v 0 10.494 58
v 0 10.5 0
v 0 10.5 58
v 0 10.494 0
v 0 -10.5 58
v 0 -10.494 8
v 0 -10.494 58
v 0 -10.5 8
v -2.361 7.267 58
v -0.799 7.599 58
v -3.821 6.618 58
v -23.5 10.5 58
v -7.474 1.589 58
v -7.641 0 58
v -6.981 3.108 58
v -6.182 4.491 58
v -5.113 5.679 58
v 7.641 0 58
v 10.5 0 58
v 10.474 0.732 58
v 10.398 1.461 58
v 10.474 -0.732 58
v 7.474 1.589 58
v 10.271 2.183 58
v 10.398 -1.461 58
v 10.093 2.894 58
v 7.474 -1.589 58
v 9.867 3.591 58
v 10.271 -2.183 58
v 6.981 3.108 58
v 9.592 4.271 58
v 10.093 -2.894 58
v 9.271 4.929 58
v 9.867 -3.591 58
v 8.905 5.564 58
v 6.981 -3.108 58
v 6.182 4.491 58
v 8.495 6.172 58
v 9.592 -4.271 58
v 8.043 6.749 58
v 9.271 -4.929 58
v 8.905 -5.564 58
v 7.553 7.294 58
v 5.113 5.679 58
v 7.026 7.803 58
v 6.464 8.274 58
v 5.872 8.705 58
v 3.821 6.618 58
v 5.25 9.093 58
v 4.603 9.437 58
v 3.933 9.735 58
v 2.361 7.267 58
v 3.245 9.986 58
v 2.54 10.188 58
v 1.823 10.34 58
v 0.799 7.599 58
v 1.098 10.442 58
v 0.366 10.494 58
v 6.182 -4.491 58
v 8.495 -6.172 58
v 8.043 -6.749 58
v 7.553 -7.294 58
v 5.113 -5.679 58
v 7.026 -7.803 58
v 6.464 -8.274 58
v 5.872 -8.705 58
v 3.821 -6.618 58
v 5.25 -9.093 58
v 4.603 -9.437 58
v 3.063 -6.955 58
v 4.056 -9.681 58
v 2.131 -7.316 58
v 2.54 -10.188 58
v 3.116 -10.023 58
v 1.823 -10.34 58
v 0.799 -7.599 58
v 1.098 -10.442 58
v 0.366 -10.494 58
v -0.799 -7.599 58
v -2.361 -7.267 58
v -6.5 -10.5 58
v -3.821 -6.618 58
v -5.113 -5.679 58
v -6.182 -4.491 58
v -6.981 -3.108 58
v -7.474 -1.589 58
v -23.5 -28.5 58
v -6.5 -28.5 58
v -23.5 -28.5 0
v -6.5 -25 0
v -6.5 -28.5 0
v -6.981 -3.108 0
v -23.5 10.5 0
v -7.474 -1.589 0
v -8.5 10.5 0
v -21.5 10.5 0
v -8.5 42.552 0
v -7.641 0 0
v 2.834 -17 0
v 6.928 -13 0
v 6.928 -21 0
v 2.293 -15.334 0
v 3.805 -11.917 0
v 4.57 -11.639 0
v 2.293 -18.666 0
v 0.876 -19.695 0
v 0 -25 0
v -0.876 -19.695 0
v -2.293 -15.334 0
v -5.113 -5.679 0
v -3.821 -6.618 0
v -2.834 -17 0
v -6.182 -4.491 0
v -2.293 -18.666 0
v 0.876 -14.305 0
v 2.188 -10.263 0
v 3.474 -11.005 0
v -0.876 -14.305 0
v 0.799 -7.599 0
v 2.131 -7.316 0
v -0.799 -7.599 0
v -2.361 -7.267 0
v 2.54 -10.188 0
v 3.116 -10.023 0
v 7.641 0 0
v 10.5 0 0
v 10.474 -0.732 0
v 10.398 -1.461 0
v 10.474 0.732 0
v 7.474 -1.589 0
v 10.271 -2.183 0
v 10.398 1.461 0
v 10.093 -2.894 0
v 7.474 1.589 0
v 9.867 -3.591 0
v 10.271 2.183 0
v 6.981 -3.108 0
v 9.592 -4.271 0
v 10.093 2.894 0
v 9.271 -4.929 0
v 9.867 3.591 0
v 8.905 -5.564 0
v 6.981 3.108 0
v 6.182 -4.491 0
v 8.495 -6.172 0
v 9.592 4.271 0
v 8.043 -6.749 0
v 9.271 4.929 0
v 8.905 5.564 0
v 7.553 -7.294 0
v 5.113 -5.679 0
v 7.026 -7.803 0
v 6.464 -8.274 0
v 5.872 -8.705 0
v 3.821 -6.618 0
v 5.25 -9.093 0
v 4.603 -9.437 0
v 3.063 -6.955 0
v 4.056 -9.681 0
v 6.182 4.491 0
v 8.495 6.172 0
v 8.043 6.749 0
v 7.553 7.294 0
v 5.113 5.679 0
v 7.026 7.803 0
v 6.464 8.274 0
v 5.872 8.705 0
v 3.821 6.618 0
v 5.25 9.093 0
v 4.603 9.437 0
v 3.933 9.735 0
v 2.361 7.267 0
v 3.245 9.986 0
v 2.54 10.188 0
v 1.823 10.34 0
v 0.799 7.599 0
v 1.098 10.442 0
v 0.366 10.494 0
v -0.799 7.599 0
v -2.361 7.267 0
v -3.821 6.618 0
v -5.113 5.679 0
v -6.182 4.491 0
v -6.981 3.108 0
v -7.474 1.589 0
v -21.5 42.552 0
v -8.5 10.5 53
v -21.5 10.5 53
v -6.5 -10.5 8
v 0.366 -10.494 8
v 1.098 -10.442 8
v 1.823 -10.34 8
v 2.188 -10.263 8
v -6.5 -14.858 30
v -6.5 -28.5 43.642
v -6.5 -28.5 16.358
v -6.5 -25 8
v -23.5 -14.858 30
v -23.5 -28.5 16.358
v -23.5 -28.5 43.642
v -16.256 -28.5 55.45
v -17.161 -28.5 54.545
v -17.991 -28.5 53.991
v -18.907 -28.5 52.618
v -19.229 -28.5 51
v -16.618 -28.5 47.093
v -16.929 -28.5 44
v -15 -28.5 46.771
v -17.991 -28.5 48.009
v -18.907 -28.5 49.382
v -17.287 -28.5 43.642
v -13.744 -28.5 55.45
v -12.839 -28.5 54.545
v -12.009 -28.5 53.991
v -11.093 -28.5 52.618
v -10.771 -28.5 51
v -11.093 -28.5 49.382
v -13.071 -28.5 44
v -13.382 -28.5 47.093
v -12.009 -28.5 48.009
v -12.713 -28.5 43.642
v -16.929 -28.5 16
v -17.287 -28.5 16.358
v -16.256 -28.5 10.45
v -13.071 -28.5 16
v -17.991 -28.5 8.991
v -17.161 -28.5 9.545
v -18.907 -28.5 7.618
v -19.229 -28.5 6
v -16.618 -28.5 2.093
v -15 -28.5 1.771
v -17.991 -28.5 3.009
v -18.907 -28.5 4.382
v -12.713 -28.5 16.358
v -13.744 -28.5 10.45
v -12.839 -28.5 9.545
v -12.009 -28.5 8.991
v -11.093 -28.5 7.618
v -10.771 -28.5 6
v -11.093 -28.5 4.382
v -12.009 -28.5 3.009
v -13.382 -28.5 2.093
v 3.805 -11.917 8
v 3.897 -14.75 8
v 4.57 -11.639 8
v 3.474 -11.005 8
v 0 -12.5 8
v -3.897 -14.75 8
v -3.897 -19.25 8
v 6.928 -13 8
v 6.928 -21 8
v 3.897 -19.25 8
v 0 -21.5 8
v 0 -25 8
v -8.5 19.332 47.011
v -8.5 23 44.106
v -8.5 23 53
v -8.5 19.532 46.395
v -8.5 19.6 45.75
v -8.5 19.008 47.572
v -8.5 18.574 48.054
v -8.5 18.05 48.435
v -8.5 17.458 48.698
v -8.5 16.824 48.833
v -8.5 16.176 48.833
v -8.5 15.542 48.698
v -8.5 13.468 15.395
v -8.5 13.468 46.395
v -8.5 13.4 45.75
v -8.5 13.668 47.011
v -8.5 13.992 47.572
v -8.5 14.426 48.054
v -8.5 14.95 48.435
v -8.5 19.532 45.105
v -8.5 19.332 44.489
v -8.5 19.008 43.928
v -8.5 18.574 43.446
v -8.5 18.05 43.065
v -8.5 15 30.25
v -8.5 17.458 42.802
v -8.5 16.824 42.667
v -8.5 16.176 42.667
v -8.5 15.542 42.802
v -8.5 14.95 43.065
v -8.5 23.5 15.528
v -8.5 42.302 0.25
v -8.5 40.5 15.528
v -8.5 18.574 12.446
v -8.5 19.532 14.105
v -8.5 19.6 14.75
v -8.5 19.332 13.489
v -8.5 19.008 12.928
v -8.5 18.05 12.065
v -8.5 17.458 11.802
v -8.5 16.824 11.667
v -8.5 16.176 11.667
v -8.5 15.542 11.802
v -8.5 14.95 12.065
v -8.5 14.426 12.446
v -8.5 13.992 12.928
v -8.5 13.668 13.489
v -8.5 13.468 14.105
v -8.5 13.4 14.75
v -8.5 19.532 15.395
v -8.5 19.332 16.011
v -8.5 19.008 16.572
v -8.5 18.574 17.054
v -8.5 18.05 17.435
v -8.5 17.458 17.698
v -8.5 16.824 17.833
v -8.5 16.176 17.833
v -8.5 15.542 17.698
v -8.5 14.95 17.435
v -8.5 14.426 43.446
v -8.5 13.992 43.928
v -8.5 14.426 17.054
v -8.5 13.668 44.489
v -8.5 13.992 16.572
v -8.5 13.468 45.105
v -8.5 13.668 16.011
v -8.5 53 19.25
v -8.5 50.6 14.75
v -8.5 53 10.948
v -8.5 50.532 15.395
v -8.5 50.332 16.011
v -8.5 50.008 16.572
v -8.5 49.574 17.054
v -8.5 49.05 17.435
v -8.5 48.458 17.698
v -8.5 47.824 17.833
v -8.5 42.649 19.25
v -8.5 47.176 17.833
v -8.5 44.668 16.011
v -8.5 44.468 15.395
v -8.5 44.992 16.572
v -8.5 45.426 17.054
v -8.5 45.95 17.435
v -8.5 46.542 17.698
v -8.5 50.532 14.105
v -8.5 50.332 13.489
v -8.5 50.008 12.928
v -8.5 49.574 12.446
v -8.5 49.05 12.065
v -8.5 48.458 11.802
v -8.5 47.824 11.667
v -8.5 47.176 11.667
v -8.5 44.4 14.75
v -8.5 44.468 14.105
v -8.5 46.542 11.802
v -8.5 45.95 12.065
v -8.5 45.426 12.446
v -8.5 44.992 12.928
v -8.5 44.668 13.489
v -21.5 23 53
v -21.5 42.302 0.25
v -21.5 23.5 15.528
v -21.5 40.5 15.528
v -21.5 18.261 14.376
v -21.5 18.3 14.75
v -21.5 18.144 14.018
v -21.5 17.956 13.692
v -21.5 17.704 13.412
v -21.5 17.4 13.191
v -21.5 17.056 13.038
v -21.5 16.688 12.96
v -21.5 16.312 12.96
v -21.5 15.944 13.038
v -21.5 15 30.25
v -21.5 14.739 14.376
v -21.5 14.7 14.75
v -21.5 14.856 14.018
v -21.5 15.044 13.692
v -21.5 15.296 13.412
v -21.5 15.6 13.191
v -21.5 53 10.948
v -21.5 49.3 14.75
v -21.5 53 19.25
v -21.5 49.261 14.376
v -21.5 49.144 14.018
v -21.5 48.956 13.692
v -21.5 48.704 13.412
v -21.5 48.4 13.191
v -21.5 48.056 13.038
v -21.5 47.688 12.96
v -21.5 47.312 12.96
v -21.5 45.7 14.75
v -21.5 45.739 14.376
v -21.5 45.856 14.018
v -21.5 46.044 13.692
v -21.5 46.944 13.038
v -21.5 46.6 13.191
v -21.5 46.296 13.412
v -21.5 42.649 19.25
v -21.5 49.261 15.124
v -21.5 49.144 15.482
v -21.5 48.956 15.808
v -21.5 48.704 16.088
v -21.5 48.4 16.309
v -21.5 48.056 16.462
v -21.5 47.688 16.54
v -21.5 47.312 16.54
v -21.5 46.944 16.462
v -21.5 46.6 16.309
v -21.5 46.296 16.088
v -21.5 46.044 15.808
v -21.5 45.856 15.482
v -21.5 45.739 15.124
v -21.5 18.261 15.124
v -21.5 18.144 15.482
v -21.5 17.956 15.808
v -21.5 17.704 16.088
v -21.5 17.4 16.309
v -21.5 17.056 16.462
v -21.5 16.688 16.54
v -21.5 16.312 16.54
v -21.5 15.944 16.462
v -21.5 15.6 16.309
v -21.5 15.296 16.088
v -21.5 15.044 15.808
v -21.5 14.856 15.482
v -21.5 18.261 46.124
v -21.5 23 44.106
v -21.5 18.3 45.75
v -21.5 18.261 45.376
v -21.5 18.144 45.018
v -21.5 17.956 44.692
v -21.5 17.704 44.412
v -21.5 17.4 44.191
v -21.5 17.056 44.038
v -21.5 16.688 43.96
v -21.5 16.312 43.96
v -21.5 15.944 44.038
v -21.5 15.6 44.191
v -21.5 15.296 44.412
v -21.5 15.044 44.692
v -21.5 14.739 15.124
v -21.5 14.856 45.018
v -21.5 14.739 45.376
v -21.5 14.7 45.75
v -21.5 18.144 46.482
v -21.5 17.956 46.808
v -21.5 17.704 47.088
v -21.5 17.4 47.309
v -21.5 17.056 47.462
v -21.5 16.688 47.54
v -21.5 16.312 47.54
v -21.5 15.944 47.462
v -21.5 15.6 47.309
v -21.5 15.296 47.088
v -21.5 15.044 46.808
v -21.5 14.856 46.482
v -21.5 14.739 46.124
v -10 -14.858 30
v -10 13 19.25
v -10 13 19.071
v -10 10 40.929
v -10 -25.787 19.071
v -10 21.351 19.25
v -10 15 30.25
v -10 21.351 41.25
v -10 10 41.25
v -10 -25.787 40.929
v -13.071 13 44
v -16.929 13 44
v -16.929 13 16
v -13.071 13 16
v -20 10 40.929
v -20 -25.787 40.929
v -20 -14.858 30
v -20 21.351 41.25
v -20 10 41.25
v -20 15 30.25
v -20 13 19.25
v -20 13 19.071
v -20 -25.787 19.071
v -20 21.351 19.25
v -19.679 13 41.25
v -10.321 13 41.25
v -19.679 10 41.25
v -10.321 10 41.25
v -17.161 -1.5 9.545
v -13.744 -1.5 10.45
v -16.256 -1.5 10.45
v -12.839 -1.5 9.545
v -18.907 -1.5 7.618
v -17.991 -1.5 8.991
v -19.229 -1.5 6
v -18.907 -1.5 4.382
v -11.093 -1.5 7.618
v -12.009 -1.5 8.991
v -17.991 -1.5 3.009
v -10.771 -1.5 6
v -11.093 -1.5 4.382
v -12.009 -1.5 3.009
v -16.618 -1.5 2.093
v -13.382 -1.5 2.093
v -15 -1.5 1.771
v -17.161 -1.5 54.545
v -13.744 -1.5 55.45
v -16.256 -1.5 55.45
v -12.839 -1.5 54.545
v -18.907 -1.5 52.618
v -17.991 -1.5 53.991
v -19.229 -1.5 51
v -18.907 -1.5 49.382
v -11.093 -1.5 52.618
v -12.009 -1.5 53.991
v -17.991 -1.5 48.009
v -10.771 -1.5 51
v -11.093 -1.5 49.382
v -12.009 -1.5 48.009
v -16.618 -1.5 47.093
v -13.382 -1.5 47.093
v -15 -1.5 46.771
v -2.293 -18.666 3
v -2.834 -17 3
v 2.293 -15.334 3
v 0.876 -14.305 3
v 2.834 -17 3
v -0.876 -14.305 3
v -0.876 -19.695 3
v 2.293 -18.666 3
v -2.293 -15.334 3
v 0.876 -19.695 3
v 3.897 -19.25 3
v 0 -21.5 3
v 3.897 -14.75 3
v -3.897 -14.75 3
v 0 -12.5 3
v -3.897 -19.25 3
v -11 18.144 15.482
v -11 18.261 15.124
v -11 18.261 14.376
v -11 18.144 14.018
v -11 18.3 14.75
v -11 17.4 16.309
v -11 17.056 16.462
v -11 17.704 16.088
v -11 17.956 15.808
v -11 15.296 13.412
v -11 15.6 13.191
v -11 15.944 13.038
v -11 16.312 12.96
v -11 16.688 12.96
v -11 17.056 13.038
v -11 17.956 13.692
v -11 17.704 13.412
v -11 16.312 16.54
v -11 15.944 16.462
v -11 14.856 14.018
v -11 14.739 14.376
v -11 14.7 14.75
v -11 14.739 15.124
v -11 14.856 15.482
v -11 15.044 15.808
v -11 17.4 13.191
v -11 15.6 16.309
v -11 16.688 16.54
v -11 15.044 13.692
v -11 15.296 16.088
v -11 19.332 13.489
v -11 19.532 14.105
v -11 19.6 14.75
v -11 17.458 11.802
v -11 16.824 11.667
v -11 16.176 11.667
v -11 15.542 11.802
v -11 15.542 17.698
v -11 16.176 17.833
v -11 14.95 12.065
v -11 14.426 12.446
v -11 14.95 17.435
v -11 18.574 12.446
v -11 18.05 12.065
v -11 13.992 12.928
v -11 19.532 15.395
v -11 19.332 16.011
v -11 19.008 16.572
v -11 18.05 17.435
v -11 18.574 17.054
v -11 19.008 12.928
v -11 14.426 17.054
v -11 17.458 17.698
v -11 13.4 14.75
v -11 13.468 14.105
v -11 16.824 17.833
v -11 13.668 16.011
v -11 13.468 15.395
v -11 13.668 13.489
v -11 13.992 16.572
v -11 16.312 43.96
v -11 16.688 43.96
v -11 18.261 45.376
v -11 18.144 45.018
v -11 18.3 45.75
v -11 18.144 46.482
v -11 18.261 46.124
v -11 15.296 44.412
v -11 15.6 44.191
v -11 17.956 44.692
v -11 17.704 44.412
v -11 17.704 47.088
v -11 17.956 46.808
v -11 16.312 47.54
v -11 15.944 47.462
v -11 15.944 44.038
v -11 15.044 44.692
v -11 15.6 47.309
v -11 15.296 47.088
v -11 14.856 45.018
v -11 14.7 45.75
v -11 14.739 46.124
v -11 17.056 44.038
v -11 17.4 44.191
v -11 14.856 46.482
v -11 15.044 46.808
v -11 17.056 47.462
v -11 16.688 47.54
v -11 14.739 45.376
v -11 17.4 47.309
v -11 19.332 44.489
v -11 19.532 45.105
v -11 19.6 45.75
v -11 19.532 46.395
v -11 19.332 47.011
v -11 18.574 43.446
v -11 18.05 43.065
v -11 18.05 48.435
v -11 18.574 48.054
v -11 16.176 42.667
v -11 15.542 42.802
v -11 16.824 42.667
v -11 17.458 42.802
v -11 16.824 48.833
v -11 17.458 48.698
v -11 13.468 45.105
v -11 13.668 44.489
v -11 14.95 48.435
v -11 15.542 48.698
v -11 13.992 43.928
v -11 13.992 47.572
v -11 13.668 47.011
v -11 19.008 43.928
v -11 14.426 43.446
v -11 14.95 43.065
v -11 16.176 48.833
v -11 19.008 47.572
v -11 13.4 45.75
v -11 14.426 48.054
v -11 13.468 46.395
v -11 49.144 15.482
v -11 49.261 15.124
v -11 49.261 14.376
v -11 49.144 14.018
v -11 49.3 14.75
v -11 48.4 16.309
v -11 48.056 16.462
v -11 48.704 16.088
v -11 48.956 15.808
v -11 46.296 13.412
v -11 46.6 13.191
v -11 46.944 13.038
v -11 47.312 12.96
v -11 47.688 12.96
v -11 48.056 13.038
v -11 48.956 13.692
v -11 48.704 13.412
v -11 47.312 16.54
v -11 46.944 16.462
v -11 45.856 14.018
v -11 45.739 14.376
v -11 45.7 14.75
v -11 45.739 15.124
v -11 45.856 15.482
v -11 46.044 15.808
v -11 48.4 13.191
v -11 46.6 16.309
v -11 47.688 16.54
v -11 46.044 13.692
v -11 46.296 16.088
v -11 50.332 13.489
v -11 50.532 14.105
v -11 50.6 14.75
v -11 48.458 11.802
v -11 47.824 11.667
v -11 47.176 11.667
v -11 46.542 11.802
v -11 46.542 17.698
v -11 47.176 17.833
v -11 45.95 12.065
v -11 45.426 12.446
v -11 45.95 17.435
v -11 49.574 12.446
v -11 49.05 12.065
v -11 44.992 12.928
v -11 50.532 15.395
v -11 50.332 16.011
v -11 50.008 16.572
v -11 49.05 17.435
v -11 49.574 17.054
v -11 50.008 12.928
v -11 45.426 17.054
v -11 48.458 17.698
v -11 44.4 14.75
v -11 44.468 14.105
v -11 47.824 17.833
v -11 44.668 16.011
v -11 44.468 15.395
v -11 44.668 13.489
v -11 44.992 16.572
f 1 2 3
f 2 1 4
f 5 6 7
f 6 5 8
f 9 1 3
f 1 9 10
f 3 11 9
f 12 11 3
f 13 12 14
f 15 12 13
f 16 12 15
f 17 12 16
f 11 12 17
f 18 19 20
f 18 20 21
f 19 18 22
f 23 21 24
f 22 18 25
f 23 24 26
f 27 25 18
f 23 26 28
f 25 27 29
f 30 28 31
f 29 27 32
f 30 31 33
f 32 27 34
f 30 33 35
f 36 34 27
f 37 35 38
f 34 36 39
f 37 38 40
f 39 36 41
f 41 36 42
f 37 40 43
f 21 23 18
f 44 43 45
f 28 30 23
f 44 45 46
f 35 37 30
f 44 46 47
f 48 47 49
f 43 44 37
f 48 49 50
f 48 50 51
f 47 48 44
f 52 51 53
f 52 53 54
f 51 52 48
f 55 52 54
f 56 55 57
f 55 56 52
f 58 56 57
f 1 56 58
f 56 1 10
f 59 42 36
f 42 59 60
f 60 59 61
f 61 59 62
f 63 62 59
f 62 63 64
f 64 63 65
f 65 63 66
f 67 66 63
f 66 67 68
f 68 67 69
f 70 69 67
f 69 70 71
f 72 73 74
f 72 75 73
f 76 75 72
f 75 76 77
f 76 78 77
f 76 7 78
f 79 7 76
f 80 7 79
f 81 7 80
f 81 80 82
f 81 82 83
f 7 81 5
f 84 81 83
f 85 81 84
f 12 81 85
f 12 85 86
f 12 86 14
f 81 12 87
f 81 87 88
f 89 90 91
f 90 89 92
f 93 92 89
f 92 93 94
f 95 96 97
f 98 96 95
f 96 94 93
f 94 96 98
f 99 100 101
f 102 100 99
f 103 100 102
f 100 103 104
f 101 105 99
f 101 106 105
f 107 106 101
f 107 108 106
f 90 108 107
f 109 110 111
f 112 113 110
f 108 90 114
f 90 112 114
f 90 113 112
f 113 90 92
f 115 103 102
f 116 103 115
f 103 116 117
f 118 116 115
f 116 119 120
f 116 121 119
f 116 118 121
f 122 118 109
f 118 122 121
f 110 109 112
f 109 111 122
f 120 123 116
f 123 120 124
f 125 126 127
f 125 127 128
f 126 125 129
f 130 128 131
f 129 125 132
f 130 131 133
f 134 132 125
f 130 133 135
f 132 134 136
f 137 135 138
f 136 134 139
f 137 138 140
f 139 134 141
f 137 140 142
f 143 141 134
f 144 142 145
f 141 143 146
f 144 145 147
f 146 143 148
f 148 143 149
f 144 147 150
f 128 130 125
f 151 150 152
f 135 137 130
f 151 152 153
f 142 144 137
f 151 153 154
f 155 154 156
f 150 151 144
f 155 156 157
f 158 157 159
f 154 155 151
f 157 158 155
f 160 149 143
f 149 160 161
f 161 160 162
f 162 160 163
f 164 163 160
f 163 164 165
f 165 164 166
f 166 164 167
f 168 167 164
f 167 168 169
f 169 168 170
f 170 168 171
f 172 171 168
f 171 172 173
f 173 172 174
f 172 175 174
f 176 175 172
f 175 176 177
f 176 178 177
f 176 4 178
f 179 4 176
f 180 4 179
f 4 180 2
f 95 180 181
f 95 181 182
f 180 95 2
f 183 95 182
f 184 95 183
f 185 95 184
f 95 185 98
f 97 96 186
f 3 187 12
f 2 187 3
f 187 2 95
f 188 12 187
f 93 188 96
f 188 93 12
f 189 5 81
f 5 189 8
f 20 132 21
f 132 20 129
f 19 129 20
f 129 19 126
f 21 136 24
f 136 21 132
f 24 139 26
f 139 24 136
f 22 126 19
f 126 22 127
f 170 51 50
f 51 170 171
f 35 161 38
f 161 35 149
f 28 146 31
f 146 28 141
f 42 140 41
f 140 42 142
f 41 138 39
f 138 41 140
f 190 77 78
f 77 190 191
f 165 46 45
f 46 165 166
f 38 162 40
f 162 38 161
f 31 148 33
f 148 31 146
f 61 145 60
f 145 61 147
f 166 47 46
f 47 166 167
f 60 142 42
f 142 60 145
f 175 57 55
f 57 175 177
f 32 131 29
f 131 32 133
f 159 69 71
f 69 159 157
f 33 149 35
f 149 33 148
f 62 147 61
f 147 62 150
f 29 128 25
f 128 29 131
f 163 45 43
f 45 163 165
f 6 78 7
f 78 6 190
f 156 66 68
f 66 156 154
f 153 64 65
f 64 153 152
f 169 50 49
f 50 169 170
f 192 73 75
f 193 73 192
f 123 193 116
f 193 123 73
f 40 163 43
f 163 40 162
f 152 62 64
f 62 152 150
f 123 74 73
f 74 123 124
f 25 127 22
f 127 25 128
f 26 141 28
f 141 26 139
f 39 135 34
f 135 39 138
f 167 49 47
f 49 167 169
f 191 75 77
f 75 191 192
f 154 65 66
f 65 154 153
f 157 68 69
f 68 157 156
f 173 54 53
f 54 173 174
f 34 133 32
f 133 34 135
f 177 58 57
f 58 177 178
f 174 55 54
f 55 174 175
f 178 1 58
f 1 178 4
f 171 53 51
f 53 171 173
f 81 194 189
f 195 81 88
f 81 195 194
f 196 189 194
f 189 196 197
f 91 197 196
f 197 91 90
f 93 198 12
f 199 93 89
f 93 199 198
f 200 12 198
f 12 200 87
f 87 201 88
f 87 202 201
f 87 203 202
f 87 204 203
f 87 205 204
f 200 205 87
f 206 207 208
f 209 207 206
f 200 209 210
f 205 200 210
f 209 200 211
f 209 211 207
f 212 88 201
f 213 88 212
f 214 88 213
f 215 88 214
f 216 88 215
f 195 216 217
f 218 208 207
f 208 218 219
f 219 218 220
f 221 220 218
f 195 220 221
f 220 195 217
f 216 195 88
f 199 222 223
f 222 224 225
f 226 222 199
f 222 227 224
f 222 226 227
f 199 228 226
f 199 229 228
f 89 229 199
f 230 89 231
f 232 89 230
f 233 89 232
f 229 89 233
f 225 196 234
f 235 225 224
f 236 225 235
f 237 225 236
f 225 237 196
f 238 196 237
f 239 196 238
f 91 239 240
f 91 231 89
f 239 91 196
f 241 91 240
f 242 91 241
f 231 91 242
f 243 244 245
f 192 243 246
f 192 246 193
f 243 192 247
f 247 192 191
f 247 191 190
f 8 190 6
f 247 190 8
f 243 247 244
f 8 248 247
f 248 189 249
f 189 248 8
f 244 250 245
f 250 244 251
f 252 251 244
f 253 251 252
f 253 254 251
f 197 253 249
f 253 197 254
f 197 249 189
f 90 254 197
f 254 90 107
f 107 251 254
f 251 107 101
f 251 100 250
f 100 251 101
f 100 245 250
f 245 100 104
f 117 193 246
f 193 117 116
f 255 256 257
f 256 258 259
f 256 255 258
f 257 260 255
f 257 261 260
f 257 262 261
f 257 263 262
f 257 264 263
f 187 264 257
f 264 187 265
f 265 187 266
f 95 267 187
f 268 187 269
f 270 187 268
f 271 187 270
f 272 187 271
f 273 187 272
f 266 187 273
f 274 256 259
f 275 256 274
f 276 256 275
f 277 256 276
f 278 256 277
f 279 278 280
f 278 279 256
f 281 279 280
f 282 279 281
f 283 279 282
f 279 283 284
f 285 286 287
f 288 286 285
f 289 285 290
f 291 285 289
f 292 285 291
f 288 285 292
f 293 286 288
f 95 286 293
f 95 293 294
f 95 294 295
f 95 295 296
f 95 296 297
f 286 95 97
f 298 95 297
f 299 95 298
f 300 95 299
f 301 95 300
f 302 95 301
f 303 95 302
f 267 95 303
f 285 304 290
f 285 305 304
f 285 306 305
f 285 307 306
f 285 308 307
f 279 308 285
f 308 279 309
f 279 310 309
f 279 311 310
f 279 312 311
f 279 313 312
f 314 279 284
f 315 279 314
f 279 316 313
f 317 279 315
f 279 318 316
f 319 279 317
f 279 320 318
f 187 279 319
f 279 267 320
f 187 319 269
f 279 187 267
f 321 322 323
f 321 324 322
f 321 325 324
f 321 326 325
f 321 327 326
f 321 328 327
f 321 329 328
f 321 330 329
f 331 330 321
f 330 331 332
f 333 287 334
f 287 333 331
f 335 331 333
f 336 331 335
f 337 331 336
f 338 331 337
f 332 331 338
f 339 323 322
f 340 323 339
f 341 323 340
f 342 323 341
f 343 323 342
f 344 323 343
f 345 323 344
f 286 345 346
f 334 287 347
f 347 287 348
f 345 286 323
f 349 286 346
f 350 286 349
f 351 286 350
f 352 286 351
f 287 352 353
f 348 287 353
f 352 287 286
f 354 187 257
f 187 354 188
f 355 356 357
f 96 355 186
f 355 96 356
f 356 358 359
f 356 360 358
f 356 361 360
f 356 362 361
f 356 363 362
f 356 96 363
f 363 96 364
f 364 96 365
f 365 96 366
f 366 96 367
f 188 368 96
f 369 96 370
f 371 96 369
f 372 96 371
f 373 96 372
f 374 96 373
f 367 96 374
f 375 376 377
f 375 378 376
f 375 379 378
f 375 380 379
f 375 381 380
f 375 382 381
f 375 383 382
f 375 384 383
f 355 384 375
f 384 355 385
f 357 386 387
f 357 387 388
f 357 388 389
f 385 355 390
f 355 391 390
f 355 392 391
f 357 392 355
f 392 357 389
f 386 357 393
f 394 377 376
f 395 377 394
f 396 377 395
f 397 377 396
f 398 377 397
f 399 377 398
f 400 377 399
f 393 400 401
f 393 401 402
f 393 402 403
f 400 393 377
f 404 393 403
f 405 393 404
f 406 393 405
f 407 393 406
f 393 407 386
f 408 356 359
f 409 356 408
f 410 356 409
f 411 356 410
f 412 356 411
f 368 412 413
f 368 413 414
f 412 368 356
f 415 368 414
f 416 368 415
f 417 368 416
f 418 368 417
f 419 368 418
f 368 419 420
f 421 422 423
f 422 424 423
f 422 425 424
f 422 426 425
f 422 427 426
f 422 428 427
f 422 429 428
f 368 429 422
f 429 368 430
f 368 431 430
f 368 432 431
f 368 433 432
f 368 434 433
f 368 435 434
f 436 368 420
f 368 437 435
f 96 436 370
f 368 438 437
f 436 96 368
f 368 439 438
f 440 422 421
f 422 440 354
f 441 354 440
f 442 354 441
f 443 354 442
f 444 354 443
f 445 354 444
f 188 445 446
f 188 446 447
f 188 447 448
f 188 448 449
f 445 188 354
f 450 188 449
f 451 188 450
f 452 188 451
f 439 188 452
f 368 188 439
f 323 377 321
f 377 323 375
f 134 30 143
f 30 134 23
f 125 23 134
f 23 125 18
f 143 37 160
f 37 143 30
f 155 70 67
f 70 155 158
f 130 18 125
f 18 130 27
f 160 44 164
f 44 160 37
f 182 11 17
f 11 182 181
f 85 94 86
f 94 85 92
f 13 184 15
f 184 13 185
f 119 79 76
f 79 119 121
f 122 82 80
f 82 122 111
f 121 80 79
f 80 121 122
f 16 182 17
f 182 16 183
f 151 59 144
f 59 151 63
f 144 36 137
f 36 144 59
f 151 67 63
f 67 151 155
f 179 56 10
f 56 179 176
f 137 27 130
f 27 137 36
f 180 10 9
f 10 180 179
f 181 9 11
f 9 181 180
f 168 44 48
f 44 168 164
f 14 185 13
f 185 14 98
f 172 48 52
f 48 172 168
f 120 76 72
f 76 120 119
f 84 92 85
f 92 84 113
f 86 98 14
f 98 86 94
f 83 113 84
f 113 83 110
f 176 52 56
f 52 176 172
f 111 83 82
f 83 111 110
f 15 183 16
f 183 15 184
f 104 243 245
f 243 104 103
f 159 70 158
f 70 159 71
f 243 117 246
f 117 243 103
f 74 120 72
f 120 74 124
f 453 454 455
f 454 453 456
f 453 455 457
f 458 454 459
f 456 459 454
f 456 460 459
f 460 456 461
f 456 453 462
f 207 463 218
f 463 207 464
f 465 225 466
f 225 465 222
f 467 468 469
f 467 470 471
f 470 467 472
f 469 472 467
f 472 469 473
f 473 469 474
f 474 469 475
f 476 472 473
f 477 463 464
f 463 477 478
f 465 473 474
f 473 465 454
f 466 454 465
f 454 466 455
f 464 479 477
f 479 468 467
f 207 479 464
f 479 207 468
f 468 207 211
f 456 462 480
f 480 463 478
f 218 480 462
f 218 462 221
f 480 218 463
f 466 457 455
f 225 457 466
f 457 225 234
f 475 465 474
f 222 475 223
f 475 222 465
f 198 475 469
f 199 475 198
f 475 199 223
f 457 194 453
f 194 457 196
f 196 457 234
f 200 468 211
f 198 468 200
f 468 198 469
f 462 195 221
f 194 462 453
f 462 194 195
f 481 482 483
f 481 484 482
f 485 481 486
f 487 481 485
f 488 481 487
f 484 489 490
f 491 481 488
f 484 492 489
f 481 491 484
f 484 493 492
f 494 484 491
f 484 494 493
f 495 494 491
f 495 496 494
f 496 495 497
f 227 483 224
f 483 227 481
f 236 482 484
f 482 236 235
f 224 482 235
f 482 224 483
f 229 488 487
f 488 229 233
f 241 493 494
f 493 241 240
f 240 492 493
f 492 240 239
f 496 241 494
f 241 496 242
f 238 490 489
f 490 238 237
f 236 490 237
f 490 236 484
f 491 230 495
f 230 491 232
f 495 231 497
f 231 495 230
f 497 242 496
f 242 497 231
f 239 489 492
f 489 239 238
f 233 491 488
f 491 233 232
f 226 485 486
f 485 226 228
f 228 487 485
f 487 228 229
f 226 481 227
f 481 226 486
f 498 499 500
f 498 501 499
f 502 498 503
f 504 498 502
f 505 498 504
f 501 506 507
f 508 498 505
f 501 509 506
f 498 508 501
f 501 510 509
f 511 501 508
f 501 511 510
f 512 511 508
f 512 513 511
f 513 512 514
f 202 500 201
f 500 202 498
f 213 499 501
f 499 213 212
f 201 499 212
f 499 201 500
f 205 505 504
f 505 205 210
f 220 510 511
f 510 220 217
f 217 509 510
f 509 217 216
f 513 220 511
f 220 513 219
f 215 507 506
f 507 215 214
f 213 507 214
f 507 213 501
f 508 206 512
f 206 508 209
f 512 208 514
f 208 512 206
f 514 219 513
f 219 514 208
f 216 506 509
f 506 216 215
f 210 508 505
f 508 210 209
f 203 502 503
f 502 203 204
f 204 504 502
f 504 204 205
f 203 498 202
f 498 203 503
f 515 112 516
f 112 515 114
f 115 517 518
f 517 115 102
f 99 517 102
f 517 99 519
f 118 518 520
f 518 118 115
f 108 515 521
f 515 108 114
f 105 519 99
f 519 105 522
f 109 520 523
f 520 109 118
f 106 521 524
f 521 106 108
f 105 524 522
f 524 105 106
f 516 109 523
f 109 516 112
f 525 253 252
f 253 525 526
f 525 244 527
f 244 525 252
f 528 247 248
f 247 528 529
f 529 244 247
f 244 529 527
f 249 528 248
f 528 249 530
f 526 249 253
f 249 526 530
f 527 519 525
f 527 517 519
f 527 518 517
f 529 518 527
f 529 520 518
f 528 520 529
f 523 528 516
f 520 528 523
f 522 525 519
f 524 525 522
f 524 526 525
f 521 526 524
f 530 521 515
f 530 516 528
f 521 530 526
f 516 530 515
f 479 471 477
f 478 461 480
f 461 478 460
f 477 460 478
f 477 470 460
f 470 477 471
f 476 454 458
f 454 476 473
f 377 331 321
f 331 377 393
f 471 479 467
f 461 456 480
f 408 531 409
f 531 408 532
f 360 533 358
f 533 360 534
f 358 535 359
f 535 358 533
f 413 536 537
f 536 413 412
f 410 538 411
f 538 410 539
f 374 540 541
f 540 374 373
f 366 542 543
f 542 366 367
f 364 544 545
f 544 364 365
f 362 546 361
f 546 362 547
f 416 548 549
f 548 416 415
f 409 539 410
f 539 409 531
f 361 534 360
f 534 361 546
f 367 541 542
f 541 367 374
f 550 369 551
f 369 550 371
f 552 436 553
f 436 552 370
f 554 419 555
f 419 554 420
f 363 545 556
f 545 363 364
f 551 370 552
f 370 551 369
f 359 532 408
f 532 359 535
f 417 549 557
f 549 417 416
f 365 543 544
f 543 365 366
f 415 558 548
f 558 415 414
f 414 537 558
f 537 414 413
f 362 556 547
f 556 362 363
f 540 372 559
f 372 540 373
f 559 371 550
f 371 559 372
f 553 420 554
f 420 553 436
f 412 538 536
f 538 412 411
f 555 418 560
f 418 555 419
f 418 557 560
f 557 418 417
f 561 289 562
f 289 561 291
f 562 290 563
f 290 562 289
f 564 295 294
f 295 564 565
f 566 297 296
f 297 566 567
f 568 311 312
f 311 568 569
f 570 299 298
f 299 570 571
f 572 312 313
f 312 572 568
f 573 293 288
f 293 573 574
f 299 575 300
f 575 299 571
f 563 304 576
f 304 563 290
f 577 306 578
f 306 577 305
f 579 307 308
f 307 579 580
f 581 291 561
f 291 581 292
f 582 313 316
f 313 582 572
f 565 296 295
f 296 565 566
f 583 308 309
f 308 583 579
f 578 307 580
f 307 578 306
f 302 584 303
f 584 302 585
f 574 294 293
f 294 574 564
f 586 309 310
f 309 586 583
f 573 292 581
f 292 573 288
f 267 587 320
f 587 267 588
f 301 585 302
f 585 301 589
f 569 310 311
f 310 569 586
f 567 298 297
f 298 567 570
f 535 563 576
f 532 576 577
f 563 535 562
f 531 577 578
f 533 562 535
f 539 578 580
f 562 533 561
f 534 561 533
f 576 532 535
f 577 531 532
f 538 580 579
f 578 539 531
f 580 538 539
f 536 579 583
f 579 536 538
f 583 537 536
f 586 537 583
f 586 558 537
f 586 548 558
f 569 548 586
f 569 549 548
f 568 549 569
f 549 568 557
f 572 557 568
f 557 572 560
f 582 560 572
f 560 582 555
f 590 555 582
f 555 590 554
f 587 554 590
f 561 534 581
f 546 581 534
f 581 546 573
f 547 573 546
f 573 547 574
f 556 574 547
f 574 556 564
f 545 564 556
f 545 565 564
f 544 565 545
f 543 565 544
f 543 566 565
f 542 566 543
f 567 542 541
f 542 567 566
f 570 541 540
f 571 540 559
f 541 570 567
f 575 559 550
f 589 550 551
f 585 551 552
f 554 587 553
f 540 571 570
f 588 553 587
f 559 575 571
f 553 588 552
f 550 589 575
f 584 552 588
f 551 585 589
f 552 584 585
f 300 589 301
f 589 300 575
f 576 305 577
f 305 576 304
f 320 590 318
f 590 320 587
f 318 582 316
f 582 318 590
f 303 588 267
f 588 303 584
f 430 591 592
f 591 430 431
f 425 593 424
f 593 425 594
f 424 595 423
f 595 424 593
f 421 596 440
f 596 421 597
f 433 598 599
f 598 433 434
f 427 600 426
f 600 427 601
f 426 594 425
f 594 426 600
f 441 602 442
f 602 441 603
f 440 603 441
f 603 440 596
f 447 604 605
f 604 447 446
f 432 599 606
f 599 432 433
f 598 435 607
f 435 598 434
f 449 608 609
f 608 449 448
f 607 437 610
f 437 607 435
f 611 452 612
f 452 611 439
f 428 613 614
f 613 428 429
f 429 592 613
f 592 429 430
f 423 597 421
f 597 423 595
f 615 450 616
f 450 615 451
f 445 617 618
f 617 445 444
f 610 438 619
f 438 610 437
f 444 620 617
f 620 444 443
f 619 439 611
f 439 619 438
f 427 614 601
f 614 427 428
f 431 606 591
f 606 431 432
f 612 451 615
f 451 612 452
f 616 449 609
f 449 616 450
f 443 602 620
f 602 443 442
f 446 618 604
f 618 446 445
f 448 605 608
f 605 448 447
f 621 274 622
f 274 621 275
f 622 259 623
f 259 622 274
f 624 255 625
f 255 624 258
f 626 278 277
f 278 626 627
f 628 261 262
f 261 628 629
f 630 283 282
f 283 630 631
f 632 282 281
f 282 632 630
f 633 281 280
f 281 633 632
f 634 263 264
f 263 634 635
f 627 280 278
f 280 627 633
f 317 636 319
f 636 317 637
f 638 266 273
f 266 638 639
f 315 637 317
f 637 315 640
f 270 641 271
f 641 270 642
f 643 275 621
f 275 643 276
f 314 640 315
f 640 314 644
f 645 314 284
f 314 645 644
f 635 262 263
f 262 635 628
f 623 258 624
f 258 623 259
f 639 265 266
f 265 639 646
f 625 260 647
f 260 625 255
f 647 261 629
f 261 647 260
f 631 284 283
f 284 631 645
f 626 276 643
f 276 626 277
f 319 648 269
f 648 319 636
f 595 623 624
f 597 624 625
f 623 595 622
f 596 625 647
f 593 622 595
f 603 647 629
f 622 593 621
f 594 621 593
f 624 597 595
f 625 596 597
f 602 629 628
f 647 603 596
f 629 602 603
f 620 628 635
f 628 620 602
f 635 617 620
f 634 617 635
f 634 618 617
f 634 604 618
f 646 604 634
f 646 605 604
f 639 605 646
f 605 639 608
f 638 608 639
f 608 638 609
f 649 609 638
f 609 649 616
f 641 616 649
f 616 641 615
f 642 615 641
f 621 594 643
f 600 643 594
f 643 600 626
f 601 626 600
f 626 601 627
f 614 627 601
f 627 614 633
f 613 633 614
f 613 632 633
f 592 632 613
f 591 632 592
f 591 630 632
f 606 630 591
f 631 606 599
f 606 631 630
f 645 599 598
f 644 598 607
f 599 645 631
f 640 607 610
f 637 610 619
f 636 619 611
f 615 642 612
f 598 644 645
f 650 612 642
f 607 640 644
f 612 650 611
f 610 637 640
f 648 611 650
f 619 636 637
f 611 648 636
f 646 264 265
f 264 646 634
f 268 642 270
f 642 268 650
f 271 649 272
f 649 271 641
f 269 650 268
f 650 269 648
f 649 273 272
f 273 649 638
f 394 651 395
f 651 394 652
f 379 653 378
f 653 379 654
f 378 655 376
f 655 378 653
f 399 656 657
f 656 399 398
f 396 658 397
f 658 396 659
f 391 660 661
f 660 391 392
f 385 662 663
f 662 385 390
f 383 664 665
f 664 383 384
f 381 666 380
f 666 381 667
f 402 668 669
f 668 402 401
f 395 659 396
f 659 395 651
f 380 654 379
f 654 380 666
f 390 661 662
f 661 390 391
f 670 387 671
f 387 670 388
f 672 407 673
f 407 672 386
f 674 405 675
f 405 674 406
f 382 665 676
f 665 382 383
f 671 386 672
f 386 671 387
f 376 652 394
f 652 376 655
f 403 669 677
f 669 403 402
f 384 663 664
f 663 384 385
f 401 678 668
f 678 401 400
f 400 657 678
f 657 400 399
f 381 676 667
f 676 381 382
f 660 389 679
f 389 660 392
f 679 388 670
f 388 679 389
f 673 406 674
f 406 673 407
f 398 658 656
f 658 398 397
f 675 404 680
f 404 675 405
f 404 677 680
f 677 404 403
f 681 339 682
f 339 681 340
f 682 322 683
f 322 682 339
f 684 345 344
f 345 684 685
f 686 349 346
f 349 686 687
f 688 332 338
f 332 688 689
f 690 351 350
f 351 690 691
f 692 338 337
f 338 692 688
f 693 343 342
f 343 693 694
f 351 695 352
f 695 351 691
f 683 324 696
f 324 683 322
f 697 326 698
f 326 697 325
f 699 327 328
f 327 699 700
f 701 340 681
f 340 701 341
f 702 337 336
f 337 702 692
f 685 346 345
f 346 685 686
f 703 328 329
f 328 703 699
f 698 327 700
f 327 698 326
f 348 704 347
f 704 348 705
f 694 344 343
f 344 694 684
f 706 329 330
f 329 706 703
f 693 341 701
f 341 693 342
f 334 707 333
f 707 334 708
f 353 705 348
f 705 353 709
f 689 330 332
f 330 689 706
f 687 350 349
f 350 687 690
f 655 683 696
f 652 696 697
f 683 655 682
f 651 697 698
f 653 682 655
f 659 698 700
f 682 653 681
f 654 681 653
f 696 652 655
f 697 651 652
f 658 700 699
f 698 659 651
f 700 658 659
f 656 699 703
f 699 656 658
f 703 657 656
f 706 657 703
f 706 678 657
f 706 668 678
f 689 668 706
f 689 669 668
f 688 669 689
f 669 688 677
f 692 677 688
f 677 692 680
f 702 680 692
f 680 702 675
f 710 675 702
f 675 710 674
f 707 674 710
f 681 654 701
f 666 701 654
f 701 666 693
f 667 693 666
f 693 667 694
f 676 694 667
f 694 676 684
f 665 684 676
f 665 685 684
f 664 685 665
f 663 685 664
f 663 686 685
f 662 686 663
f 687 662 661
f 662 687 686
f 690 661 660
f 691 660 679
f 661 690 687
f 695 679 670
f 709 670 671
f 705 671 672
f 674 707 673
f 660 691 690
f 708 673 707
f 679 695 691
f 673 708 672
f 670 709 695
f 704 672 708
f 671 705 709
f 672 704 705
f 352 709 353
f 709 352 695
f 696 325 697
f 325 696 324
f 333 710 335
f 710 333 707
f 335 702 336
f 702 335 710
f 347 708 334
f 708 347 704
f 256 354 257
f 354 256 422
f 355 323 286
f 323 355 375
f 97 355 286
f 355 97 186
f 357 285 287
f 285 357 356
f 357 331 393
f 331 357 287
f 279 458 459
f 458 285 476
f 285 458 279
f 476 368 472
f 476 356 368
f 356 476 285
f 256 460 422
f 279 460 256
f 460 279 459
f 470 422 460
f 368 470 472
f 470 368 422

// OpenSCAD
// file: polyholes.scad
//
// Mendel90
//
// GNU GPL v2
// nop.head@gmail.com
// hydraraptor.blogspot.com
//
// See http://hydraraptor.blogspot.com/2011/02/polyholes.html
//
function sides(r) = max(round(4 *r),3);
function correctedRadius(r,n) = 0.1 + r / cos(180 / n);
function correctedDiameter(d) = 0.2 + d / cos(180 / sides(d / 2));

module polyCircle(r, center = false) {
    n = sides(r);
    circle(r = correctedRadius(r,n), $fn = n, center = center);
}

module poly_circle(r, center = false) {
	polyCircle(r, center);
}

module polyCylinder(r, h, center = false) {
    n = sides(r);
    cylinder(h = h, r = correctedRadius(r,n), $fn = n, center = center);
}

module poly_cylinder(r, h, center = false) {
	polyCylinder(r,h,center);
}

module polydCylinder(r, center = false) {
    n = sides(r);
    r = correctedRadius(r,n);
    cylinder(h = h, r = r, $fn = n, center = center);
    translate([0, -r, 0])
        cube([r, 2 * r, h]);
}

module poly_d_cylinder(r, center = false) {
	polydCylinder(r,center);
}
// file: bearing.scad
// PRUSA iteration3
// Bearing holders
// GNU GPL v3
// Josef Průša <iam@josefprusa.cz> and contributors
// http://www.reprap.org/wiki/Prusa_Mendel
// http://prusamendel.org

use <polyholes.scad>

bearing_diameter = 15;

module horizontal_bearing_base(bearings=1){
 translate(v=[0,0,6]) cube(size = [24,8+bearings*25,12], center = true);	
}
module horizontal_bearing_holes(bearings=1){
 cutter_lenght = 10+bearings*25;
 one_holder_lenght = 8+25;
 holder_lenght = 8+bearings*25;
 
 // Main bearing cut
 difference(){
  translate(v=[0,0,12]) rotate(a=[90,0,0]) translate(v=[0,0,-cutter_lenght/2]) cylinder(h = cutter_lenght, r=bearing_diameter/2, $fn=50);
  // Bearing retainers
  translate(v=[0,1-holder_lenght/2,3]) cube(size = [24,6,8], center = true);
  translate(v=[0,-1+holder_lenght/2,3]) cube(size = [24,6,8], center = true);
 }
 
 // Ziptie cutouts
 ziptie_cut_ofset = 0;
 for ( i = [0 : bearings-1] ){
  // For easier positioning I move them by half of one 
  // bearing holder then add each bearign lenght and then center again
  translate(v=[0,-holder_lenght/2,0]) translate(v=[0,one_holder_lenght/2+i*25,0]) difference(){
   union(){
    translate(v=[0,2-6,12]) rotate(a=[90,0,0]) translate(v=[0,0,0]) cylinder(h = 4, r=12.5, $fn=50);
    translate(v=[0,2+6,12]) rotate(a=[90,0,0]) translate(v=[0,0,0]) cylinder(h = 4, r=12.5, $fn=50);
   }
   translate(v=[0,10,12]) rotate(a=[90,0,0]) translate(v=[0,0,0]) cylinder(h = 24, r=10, $fn=50);
  }
 }
 
}

module horizontal_bearing_test(){
 difference(){
  horizontal_bearing_base(1);
  horizontal_bearing_holes(1);
 }
 translate(v=[30,0,0]) difference(){
  horizontal_bearing_base(2);
  horizontal_bearing_holes(2);
 }
 translate(v=[60,0,0]) difference(){
  horizontal_bearing_base(3);
  horizontal_bearing_holes(3);
 }
}



thinwall = 3;
bearing_size = bearing_diameter + 2 * thinwall;

module vertical_bearing_base(){
 translate(v=[-2-bearing_size/4,0,29]) cube(size = [4+bearing_size/2,bearing_size,58], center = true);
 cylinder(h = 58, r=bearing_size/2, $fn = 90);
}

module vertical_bearing_holes(){
  translate(v=[0,0,-1]) poly_cylinder(h = 62, r=bearing_diameter/2);
  rotate(a=[0,0,-70]) translate(v=[bearing_diameter/2-1,-0.5,-1]) cube(size = [thinwall*2,1,62]);

}

difference(){
vertical_bearing_base();
vertical_bearing_holes();
}
// file: x-end.scad
// PRUSA iteration3
// X end prototype
// GNU GPL v3
// Josef Průša <iam@josefprusa.cz> and contributors
// http://www.reprap.org/wiki/Prusa_Mendel
// http://prusamendel.org

use <bearing.scad>
use <polyholes.scad>
rod_distance = 45;

module x_end_base(){
// Main block
height = 58;
translate(v=[-15,-9,height/2]) cube(size = [17,39,height], center = true);
// Bearing holder
 vertical_bearing_base();	
//Nut trap
 // Cube
 translate(v=[-2-2,-17,4]) cube(size = [8,16,8], center = true);
 // Hexagon
 translate(v=[0,-17,0]) rotate([0,0,30]) cylinder(h = 8, r=8, $fn = 6);






}



module x_end_holes(){
 vertical_bearing_holes();
// Belt hole
translate(v=[-1,0,0]){
// Stress relief
//translate(v=[-5.5-10+1.5,-10-1,30]) cube(size = [20,1,28], center = true);
translate(v=[-15,-29,30]) rotate([45,0,0]) cube(size = [20,20,20], center = true);
difference(){
	translate(v=[-5.5-10+1.5,-10,30]) cube(size = [10,46,28], center = true);

	

	// Nice edges

	translate(v=[-5.5-10+1.5,-10,30+23]) rotate([0,45,0]) cube(size = [10,46,28], center = true);
	translate(v=[-5.5-10+1.5,-10,30+23]) rotate([0,-45,0]) cube(size = [10,46,28], center = true);
	translate(v=[-5.5-10+1.5,-10,30-23]) rotate([0,45,0]) cube(size = [10,46,28], center = true);
	translate(v=[-5.5-10+1.5,-10,30-23]) rotate([0,-45,0]) cube(size = [10,46,28], center = true);

}
}

// Bottom pushfit rod
translate(v=[-15,-41.5,6]) rotate(a=[-90,0,0]) pushfit_rod(8.1,40);
// Top pushfit rod
translate(v=[-15,-41.5,rod_distance+6]) rotate(a=[-90,0,0]) pushfit_rod(8.1,40);
// Nut trap
 translate(v=[0,-17,-0.5]) poly_cylinder(h = 4, r=2.6, $fn=25);
 translate(v=[0,-17,3]) rotate([0,0,30]) cylinder(h = 10, r=4.5, $fn = 6);

}


// Final prototype
module x_end_plain(){
 difference(){
  x_end_base();
  x_end_holes();
 }
}

x_end_plain();


module pushfit_rod(diameter,length){
 poly_cylinder(h = length, r=diameter/2);
 difference(){
 	translate(v=[0,-diameter/2.85,length/2]) rotate([0,0,45]) cube(size = [diameter/2,diameter/2,length], center = true);
 	translate(v=[0,-diameter/4-diameter/2-0.4,length/2]) rotate([0,0,0]) cube(size = [diameter,diameter/2,length], center = true);
 }
 //translate(v=[0,-diameter/2-2,length/2]) cube(size = [diameter,1,length], center = true);
}
// main file
// PRUSA iteration3
// X end motor
// GNU GPL v3
// Josef Průša <iam@josefprusa.cz> and contributors
// http://www.reprap.org/wiki/Prusa_Mendel
// http://prusamendel.org

use <x-end.scad>

module x_end_motor_base(){
 x_end_base();
 translate(v=[-15,31,26.5]) cube(size = [13,44,53], center = true);
}

module x_end_motor_holes(){
 x_end_holes();
 // Position to place
 translate(v=[-1,32,30.25]){
  // Belt hole
  translate(v=[-14,1,0]) cube(size = [10,46,22], center = true);
  // Motor mounting holes
  translate(v=[20,-15.5,-15.5]) rotate(a=[0,-90,0]) rotate(a=[0,0,90]) cylinder(h = 70, r=1.8, $fn=30);
  translate(v=[0,-15.5,-15.5]) rotate(a=[0,-90,0]) rotate(a=[0,0,90]) cylinder(h = 10, r=3.1, $fn=30);
 

  translate(v=[20,-15.5,15.5]) rotate(a=[0,-90,0]) rotate(a=[0,0,90]) cylinder(h = 70, r=1.8, $fn=30);
  translate(v=[0,-15.5,15.5]) rotate(a=[0,-90,0]) rotate(a=[0,0,90]) cylinder(h = 10, r=3.1, $fn=30);


  translate(v=[20,15.5,-15.5]) rotate(a=[0,-90,0]) rotate(a=[0,0,90]) cylinder(h = 70, r=1.8, $fn=30);
  translate(v=[0,15.5,-15.5]) rotate(a=[0,-90,0]) rotate(a=[0,0,90]) cylinder(h = 10, r=3.1, $fn=30);


  translate(v=[20,15.5,15.5]) rotate(a=[0,-90,0]) rotate(a=[0,0,90]) cylinder(h = 70, r=1.8, $fn=30);
  translate(v=[1,15.5,15.5]) rotate(a=[0,-90,0]) rotate(a=[0,0,90]) cylinder(h = 10, r=3.1, $fn=30);
  translate(v=[-10,12,10]) cube(size = [60,42,42], center = true);

  // Material saving cutout 
  translate(v=[-10,12,10]) cube(size = [60,42,42], center = true);

  // Material saving cutout
  translate(v=[-10,40,-30]) rotate(a=[45,0,0])  cube(size = [60,42,42], center = true);
  // Motor shaft cutout
  translate(v=[0,0,0]) rotate(a=[0,-90,0]) rotate(a=[0,0,90]) cylinder(h = 70, r=17, $fn=6);
 }
}

// Final part
module x_end_motor(){
 difference(){
  x_end_motor_base();
  x_end_motor_holes();
 }
}

x_end_motor();
